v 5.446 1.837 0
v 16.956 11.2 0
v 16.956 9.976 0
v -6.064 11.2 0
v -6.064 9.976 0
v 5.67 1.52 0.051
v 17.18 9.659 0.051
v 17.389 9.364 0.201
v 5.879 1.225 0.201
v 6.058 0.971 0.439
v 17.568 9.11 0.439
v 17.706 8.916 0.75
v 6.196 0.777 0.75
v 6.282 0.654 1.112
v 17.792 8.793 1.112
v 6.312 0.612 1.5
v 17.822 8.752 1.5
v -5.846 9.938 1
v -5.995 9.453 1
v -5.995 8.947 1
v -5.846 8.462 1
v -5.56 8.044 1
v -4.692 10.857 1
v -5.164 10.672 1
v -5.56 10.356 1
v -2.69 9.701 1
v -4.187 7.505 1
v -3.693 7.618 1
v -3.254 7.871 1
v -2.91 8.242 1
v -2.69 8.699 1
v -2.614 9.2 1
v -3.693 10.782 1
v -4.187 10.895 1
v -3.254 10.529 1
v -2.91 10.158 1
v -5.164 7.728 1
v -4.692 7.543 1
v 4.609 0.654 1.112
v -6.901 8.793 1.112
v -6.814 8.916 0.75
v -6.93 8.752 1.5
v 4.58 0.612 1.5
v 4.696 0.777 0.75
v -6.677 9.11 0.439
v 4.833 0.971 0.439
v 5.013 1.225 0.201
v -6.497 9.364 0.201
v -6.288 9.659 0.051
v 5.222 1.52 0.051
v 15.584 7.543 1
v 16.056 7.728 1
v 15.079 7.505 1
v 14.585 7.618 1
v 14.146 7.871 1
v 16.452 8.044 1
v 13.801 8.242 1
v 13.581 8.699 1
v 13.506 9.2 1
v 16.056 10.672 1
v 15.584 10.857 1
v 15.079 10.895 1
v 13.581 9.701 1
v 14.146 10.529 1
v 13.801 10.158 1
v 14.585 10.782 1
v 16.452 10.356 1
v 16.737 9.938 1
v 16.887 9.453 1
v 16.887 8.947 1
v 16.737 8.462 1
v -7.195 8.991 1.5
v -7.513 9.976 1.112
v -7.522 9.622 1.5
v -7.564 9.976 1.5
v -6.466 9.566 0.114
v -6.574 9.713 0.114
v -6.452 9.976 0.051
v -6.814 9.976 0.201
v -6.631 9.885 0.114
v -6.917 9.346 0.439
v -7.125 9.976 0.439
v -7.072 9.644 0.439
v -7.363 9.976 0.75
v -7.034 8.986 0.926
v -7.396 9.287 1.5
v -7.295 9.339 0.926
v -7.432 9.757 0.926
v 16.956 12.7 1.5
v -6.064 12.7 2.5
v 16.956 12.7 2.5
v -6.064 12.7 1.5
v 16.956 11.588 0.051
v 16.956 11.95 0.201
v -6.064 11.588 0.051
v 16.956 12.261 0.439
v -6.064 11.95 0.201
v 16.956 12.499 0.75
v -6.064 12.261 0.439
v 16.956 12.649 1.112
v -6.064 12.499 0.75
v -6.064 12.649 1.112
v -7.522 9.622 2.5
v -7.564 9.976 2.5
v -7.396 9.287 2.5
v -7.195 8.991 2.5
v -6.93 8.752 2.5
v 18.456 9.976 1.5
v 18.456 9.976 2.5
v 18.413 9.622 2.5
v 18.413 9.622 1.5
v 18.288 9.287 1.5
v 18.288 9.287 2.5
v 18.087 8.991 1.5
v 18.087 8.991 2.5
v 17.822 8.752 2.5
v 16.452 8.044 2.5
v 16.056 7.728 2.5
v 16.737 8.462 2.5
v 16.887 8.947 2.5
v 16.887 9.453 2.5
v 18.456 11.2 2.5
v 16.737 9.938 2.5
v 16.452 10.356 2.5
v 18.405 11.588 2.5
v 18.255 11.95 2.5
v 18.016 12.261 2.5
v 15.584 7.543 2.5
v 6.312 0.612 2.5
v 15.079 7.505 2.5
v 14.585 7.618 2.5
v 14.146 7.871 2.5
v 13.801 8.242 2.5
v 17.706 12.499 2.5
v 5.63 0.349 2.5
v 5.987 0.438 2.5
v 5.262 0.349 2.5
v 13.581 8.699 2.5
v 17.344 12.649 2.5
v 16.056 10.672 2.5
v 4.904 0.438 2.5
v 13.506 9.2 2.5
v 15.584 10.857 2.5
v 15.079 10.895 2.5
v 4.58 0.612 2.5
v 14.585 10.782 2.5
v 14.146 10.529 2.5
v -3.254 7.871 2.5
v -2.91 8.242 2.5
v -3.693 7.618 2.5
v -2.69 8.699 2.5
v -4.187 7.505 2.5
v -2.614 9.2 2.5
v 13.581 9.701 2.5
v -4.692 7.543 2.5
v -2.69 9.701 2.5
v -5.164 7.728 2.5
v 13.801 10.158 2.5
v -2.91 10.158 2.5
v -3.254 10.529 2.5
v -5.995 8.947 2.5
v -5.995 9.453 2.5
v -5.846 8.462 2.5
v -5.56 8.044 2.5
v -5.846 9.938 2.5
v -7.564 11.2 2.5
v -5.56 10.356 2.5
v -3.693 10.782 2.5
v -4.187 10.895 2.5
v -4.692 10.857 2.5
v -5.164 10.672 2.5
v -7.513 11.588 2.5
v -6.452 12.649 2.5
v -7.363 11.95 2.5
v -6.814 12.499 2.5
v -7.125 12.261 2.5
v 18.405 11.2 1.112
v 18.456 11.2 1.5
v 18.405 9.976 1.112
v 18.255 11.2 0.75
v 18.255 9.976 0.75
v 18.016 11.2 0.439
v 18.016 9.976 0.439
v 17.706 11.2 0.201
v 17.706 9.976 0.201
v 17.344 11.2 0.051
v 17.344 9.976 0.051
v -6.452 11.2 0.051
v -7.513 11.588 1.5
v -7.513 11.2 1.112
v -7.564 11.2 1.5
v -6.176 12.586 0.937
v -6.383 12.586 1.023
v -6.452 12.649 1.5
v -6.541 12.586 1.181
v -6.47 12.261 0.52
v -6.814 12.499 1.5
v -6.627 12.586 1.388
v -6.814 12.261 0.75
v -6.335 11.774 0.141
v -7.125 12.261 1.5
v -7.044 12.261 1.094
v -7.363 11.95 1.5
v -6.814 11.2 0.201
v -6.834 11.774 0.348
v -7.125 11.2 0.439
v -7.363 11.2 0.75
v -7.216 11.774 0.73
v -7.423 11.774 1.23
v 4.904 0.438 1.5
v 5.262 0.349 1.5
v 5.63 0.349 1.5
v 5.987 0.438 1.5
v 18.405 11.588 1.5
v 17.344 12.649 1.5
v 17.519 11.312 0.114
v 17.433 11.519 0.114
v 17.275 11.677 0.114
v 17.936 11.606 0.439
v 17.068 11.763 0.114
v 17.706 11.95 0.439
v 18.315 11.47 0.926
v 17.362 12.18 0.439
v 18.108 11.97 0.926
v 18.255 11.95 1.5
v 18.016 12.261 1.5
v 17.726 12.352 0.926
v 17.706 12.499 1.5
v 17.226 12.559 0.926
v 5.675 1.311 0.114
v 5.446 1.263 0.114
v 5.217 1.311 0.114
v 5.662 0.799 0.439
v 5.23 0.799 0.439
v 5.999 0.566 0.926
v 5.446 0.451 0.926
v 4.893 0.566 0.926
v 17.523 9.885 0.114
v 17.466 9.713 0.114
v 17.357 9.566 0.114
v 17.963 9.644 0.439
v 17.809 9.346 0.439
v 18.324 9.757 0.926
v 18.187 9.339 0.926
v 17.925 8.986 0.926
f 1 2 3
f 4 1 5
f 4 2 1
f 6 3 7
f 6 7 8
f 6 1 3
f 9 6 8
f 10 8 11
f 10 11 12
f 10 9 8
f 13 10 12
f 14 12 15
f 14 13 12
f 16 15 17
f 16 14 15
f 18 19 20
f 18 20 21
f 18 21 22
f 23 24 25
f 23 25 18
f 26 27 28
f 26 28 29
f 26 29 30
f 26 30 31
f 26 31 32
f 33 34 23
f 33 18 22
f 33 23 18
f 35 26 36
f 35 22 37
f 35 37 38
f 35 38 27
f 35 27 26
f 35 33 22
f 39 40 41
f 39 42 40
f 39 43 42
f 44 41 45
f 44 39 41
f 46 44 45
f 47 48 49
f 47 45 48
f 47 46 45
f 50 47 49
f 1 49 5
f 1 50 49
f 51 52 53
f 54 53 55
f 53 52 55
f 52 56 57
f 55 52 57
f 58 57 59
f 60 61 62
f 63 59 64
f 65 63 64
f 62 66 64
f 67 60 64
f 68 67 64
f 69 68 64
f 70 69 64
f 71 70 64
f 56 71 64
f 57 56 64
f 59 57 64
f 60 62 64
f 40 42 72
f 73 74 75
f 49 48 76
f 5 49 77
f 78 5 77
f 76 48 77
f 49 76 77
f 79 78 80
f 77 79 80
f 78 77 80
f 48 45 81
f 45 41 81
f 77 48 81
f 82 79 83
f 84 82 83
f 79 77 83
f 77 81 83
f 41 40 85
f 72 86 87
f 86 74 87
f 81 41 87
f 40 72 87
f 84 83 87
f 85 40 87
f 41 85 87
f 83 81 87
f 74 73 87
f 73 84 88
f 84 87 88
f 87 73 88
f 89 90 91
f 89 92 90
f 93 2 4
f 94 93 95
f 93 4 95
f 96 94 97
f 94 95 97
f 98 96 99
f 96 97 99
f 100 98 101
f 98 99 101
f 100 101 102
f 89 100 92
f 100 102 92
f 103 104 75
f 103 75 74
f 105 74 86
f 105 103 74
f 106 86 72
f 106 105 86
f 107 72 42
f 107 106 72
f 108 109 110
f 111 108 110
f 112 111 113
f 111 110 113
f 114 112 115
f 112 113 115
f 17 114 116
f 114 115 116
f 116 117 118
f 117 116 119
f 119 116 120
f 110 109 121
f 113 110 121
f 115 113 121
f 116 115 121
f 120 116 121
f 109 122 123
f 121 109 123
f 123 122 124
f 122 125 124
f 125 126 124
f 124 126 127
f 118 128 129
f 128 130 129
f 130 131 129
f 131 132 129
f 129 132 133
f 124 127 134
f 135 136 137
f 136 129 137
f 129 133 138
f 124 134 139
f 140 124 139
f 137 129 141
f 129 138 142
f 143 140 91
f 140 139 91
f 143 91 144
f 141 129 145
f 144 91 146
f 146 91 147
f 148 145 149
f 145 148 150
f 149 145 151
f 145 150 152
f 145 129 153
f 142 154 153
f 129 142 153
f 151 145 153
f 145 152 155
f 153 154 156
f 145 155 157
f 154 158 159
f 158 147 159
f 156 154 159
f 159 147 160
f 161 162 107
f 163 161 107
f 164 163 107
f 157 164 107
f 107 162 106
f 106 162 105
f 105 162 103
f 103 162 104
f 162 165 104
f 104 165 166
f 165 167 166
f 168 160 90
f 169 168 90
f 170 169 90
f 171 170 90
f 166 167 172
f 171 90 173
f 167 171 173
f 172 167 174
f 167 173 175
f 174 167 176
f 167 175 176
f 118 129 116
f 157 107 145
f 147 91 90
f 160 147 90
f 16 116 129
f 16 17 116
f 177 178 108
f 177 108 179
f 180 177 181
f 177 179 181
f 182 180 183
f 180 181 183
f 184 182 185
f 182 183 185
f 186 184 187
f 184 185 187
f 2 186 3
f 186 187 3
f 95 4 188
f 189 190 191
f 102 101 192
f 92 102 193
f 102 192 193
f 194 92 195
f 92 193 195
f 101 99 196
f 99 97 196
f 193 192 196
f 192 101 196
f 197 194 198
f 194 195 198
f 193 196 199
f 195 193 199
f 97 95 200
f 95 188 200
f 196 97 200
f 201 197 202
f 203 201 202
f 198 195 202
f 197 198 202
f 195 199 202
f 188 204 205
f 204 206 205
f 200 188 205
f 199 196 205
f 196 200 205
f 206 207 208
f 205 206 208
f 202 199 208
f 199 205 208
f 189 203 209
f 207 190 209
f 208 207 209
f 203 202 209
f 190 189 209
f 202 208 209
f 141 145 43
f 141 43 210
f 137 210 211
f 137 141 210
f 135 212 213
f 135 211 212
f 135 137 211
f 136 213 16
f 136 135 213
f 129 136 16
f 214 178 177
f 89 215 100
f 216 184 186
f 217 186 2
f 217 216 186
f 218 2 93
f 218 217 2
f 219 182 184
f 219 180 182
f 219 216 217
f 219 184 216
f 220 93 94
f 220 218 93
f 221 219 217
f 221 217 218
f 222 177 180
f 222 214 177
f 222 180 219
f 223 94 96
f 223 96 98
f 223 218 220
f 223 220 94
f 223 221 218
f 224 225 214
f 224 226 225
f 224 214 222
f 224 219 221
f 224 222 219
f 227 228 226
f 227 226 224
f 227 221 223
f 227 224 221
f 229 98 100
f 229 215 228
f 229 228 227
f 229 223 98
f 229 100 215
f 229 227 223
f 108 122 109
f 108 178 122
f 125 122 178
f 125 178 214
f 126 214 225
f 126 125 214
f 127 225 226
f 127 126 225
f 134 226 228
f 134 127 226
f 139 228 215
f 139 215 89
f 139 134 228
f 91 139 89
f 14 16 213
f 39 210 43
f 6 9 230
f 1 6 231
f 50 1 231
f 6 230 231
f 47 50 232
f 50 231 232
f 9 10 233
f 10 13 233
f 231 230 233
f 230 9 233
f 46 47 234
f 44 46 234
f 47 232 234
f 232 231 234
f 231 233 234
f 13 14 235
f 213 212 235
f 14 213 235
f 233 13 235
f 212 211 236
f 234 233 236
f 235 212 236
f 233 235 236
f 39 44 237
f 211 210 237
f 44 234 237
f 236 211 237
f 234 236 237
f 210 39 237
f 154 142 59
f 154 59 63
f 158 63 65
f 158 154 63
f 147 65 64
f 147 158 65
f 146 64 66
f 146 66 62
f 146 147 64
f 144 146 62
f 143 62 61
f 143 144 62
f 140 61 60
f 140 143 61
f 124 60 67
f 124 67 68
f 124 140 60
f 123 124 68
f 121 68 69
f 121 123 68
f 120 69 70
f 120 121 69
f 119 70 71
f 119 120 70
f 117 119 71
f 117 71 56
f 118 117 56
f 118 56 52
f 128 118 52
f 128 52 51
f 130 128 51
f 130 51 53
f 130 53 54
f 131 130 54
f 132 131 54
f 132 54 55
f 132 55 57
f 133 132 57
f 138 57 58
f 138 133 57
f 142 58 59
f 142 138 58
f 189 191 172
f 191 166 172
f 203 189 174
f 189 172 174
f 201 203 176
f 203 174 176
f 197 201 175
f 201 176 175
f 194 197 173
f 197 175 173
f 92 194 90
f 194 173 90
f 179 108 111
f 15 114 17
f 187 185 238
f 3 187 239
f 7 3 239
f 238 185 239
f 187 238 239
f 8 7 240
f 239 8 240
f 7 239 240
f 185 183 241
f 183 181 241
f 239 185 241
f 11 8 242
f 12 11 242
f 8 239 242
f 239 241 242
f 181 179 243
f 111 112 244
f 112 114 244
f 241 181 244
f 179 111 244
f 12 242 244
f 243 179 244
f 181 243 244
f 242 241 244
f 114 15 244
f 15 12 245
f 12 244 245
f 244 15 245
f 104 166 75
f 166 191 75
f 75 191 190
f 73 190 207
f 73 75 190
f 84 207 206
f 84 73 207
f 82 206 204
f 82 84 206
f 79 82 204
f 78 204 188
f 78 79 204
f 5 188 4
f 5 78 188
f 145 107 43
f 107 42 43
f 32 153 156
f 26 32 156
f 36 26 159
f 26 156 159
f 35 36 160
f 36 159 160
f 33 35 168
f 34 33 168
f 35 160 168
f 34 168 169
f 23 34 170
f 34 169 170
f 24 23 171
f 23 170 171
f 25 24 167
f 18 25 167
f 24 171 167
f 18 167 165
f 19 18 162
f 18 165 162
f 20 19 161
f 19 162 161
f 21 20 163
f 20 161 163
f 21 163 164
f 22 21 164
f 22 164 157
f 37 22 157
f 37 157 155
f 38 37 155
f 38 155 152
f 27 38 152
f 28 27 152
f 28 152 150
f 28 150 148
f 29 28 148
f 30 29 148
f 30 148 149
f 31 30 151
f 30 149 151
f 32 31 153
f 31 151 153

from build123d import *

# Parameters (mm, degrees)
BOSS_EXTRUDE1_DEPTH = 2.5
SKETCH2_R           = 1.7
CUT_EXTRUDE1_DEPTH  = 1.5
FILLET1_R           = 1.5


with BuildPart() as part:
    # Sketch1 → Boss-Extrude1 (new body)
    with BuildSketch(Plane.XY):
        Polygon((-7.56419618, 12.7), (-7.56419618, 9.2), (5.44580382, 0), (5.44580382, 12.7), align=None)
    extrude(amount=BOSS_EXTRUDE1_DEPTH)

    # Sketch2 → Cut-Extrude1 (cut)
    with BuildSketch(Plane.XY.offset(2.5)):
        with Locations((-4.31419618, 9.2)):
            Circle(SKETCH2_R)
    extrude(amount=-CUT_EXTRUDE1_DEPTH, mode=Mode.SUBTRACT)

    # Mirror2: part across plane


with BuildPart() as part_1:
    add(part.part)
    add(part.part.mirror(Plane(origin=(5.44580382, 0, 2.5), x_dir=(0, 0, 1), z_dir=(-1, 0, 0))))

    # Fillet1
    fillet1_edges = [part_1.edges().sort_by_distance(p)[0] for p in [
        (18.45580382, 12.7, 1.25),
        (18.45580382, 9.2, 1.25),
        (5.44580382, 0, 1.25),
        (18.45580382, 10.95, 0),
        (11.95080382, 4.6, 0),
        (-1.05919618, 4.6, 0),
        (-7.56419618, 10.95, 0),
        (5.44580382, 12.7, 0),
        (-7.56419618, 9.2, 1.25),
        (-7.56419618, 12.7, 1.25),
    ]]
    fillet(fillet1_edges, radius=FILLET1_R)


solid = part_1.part
